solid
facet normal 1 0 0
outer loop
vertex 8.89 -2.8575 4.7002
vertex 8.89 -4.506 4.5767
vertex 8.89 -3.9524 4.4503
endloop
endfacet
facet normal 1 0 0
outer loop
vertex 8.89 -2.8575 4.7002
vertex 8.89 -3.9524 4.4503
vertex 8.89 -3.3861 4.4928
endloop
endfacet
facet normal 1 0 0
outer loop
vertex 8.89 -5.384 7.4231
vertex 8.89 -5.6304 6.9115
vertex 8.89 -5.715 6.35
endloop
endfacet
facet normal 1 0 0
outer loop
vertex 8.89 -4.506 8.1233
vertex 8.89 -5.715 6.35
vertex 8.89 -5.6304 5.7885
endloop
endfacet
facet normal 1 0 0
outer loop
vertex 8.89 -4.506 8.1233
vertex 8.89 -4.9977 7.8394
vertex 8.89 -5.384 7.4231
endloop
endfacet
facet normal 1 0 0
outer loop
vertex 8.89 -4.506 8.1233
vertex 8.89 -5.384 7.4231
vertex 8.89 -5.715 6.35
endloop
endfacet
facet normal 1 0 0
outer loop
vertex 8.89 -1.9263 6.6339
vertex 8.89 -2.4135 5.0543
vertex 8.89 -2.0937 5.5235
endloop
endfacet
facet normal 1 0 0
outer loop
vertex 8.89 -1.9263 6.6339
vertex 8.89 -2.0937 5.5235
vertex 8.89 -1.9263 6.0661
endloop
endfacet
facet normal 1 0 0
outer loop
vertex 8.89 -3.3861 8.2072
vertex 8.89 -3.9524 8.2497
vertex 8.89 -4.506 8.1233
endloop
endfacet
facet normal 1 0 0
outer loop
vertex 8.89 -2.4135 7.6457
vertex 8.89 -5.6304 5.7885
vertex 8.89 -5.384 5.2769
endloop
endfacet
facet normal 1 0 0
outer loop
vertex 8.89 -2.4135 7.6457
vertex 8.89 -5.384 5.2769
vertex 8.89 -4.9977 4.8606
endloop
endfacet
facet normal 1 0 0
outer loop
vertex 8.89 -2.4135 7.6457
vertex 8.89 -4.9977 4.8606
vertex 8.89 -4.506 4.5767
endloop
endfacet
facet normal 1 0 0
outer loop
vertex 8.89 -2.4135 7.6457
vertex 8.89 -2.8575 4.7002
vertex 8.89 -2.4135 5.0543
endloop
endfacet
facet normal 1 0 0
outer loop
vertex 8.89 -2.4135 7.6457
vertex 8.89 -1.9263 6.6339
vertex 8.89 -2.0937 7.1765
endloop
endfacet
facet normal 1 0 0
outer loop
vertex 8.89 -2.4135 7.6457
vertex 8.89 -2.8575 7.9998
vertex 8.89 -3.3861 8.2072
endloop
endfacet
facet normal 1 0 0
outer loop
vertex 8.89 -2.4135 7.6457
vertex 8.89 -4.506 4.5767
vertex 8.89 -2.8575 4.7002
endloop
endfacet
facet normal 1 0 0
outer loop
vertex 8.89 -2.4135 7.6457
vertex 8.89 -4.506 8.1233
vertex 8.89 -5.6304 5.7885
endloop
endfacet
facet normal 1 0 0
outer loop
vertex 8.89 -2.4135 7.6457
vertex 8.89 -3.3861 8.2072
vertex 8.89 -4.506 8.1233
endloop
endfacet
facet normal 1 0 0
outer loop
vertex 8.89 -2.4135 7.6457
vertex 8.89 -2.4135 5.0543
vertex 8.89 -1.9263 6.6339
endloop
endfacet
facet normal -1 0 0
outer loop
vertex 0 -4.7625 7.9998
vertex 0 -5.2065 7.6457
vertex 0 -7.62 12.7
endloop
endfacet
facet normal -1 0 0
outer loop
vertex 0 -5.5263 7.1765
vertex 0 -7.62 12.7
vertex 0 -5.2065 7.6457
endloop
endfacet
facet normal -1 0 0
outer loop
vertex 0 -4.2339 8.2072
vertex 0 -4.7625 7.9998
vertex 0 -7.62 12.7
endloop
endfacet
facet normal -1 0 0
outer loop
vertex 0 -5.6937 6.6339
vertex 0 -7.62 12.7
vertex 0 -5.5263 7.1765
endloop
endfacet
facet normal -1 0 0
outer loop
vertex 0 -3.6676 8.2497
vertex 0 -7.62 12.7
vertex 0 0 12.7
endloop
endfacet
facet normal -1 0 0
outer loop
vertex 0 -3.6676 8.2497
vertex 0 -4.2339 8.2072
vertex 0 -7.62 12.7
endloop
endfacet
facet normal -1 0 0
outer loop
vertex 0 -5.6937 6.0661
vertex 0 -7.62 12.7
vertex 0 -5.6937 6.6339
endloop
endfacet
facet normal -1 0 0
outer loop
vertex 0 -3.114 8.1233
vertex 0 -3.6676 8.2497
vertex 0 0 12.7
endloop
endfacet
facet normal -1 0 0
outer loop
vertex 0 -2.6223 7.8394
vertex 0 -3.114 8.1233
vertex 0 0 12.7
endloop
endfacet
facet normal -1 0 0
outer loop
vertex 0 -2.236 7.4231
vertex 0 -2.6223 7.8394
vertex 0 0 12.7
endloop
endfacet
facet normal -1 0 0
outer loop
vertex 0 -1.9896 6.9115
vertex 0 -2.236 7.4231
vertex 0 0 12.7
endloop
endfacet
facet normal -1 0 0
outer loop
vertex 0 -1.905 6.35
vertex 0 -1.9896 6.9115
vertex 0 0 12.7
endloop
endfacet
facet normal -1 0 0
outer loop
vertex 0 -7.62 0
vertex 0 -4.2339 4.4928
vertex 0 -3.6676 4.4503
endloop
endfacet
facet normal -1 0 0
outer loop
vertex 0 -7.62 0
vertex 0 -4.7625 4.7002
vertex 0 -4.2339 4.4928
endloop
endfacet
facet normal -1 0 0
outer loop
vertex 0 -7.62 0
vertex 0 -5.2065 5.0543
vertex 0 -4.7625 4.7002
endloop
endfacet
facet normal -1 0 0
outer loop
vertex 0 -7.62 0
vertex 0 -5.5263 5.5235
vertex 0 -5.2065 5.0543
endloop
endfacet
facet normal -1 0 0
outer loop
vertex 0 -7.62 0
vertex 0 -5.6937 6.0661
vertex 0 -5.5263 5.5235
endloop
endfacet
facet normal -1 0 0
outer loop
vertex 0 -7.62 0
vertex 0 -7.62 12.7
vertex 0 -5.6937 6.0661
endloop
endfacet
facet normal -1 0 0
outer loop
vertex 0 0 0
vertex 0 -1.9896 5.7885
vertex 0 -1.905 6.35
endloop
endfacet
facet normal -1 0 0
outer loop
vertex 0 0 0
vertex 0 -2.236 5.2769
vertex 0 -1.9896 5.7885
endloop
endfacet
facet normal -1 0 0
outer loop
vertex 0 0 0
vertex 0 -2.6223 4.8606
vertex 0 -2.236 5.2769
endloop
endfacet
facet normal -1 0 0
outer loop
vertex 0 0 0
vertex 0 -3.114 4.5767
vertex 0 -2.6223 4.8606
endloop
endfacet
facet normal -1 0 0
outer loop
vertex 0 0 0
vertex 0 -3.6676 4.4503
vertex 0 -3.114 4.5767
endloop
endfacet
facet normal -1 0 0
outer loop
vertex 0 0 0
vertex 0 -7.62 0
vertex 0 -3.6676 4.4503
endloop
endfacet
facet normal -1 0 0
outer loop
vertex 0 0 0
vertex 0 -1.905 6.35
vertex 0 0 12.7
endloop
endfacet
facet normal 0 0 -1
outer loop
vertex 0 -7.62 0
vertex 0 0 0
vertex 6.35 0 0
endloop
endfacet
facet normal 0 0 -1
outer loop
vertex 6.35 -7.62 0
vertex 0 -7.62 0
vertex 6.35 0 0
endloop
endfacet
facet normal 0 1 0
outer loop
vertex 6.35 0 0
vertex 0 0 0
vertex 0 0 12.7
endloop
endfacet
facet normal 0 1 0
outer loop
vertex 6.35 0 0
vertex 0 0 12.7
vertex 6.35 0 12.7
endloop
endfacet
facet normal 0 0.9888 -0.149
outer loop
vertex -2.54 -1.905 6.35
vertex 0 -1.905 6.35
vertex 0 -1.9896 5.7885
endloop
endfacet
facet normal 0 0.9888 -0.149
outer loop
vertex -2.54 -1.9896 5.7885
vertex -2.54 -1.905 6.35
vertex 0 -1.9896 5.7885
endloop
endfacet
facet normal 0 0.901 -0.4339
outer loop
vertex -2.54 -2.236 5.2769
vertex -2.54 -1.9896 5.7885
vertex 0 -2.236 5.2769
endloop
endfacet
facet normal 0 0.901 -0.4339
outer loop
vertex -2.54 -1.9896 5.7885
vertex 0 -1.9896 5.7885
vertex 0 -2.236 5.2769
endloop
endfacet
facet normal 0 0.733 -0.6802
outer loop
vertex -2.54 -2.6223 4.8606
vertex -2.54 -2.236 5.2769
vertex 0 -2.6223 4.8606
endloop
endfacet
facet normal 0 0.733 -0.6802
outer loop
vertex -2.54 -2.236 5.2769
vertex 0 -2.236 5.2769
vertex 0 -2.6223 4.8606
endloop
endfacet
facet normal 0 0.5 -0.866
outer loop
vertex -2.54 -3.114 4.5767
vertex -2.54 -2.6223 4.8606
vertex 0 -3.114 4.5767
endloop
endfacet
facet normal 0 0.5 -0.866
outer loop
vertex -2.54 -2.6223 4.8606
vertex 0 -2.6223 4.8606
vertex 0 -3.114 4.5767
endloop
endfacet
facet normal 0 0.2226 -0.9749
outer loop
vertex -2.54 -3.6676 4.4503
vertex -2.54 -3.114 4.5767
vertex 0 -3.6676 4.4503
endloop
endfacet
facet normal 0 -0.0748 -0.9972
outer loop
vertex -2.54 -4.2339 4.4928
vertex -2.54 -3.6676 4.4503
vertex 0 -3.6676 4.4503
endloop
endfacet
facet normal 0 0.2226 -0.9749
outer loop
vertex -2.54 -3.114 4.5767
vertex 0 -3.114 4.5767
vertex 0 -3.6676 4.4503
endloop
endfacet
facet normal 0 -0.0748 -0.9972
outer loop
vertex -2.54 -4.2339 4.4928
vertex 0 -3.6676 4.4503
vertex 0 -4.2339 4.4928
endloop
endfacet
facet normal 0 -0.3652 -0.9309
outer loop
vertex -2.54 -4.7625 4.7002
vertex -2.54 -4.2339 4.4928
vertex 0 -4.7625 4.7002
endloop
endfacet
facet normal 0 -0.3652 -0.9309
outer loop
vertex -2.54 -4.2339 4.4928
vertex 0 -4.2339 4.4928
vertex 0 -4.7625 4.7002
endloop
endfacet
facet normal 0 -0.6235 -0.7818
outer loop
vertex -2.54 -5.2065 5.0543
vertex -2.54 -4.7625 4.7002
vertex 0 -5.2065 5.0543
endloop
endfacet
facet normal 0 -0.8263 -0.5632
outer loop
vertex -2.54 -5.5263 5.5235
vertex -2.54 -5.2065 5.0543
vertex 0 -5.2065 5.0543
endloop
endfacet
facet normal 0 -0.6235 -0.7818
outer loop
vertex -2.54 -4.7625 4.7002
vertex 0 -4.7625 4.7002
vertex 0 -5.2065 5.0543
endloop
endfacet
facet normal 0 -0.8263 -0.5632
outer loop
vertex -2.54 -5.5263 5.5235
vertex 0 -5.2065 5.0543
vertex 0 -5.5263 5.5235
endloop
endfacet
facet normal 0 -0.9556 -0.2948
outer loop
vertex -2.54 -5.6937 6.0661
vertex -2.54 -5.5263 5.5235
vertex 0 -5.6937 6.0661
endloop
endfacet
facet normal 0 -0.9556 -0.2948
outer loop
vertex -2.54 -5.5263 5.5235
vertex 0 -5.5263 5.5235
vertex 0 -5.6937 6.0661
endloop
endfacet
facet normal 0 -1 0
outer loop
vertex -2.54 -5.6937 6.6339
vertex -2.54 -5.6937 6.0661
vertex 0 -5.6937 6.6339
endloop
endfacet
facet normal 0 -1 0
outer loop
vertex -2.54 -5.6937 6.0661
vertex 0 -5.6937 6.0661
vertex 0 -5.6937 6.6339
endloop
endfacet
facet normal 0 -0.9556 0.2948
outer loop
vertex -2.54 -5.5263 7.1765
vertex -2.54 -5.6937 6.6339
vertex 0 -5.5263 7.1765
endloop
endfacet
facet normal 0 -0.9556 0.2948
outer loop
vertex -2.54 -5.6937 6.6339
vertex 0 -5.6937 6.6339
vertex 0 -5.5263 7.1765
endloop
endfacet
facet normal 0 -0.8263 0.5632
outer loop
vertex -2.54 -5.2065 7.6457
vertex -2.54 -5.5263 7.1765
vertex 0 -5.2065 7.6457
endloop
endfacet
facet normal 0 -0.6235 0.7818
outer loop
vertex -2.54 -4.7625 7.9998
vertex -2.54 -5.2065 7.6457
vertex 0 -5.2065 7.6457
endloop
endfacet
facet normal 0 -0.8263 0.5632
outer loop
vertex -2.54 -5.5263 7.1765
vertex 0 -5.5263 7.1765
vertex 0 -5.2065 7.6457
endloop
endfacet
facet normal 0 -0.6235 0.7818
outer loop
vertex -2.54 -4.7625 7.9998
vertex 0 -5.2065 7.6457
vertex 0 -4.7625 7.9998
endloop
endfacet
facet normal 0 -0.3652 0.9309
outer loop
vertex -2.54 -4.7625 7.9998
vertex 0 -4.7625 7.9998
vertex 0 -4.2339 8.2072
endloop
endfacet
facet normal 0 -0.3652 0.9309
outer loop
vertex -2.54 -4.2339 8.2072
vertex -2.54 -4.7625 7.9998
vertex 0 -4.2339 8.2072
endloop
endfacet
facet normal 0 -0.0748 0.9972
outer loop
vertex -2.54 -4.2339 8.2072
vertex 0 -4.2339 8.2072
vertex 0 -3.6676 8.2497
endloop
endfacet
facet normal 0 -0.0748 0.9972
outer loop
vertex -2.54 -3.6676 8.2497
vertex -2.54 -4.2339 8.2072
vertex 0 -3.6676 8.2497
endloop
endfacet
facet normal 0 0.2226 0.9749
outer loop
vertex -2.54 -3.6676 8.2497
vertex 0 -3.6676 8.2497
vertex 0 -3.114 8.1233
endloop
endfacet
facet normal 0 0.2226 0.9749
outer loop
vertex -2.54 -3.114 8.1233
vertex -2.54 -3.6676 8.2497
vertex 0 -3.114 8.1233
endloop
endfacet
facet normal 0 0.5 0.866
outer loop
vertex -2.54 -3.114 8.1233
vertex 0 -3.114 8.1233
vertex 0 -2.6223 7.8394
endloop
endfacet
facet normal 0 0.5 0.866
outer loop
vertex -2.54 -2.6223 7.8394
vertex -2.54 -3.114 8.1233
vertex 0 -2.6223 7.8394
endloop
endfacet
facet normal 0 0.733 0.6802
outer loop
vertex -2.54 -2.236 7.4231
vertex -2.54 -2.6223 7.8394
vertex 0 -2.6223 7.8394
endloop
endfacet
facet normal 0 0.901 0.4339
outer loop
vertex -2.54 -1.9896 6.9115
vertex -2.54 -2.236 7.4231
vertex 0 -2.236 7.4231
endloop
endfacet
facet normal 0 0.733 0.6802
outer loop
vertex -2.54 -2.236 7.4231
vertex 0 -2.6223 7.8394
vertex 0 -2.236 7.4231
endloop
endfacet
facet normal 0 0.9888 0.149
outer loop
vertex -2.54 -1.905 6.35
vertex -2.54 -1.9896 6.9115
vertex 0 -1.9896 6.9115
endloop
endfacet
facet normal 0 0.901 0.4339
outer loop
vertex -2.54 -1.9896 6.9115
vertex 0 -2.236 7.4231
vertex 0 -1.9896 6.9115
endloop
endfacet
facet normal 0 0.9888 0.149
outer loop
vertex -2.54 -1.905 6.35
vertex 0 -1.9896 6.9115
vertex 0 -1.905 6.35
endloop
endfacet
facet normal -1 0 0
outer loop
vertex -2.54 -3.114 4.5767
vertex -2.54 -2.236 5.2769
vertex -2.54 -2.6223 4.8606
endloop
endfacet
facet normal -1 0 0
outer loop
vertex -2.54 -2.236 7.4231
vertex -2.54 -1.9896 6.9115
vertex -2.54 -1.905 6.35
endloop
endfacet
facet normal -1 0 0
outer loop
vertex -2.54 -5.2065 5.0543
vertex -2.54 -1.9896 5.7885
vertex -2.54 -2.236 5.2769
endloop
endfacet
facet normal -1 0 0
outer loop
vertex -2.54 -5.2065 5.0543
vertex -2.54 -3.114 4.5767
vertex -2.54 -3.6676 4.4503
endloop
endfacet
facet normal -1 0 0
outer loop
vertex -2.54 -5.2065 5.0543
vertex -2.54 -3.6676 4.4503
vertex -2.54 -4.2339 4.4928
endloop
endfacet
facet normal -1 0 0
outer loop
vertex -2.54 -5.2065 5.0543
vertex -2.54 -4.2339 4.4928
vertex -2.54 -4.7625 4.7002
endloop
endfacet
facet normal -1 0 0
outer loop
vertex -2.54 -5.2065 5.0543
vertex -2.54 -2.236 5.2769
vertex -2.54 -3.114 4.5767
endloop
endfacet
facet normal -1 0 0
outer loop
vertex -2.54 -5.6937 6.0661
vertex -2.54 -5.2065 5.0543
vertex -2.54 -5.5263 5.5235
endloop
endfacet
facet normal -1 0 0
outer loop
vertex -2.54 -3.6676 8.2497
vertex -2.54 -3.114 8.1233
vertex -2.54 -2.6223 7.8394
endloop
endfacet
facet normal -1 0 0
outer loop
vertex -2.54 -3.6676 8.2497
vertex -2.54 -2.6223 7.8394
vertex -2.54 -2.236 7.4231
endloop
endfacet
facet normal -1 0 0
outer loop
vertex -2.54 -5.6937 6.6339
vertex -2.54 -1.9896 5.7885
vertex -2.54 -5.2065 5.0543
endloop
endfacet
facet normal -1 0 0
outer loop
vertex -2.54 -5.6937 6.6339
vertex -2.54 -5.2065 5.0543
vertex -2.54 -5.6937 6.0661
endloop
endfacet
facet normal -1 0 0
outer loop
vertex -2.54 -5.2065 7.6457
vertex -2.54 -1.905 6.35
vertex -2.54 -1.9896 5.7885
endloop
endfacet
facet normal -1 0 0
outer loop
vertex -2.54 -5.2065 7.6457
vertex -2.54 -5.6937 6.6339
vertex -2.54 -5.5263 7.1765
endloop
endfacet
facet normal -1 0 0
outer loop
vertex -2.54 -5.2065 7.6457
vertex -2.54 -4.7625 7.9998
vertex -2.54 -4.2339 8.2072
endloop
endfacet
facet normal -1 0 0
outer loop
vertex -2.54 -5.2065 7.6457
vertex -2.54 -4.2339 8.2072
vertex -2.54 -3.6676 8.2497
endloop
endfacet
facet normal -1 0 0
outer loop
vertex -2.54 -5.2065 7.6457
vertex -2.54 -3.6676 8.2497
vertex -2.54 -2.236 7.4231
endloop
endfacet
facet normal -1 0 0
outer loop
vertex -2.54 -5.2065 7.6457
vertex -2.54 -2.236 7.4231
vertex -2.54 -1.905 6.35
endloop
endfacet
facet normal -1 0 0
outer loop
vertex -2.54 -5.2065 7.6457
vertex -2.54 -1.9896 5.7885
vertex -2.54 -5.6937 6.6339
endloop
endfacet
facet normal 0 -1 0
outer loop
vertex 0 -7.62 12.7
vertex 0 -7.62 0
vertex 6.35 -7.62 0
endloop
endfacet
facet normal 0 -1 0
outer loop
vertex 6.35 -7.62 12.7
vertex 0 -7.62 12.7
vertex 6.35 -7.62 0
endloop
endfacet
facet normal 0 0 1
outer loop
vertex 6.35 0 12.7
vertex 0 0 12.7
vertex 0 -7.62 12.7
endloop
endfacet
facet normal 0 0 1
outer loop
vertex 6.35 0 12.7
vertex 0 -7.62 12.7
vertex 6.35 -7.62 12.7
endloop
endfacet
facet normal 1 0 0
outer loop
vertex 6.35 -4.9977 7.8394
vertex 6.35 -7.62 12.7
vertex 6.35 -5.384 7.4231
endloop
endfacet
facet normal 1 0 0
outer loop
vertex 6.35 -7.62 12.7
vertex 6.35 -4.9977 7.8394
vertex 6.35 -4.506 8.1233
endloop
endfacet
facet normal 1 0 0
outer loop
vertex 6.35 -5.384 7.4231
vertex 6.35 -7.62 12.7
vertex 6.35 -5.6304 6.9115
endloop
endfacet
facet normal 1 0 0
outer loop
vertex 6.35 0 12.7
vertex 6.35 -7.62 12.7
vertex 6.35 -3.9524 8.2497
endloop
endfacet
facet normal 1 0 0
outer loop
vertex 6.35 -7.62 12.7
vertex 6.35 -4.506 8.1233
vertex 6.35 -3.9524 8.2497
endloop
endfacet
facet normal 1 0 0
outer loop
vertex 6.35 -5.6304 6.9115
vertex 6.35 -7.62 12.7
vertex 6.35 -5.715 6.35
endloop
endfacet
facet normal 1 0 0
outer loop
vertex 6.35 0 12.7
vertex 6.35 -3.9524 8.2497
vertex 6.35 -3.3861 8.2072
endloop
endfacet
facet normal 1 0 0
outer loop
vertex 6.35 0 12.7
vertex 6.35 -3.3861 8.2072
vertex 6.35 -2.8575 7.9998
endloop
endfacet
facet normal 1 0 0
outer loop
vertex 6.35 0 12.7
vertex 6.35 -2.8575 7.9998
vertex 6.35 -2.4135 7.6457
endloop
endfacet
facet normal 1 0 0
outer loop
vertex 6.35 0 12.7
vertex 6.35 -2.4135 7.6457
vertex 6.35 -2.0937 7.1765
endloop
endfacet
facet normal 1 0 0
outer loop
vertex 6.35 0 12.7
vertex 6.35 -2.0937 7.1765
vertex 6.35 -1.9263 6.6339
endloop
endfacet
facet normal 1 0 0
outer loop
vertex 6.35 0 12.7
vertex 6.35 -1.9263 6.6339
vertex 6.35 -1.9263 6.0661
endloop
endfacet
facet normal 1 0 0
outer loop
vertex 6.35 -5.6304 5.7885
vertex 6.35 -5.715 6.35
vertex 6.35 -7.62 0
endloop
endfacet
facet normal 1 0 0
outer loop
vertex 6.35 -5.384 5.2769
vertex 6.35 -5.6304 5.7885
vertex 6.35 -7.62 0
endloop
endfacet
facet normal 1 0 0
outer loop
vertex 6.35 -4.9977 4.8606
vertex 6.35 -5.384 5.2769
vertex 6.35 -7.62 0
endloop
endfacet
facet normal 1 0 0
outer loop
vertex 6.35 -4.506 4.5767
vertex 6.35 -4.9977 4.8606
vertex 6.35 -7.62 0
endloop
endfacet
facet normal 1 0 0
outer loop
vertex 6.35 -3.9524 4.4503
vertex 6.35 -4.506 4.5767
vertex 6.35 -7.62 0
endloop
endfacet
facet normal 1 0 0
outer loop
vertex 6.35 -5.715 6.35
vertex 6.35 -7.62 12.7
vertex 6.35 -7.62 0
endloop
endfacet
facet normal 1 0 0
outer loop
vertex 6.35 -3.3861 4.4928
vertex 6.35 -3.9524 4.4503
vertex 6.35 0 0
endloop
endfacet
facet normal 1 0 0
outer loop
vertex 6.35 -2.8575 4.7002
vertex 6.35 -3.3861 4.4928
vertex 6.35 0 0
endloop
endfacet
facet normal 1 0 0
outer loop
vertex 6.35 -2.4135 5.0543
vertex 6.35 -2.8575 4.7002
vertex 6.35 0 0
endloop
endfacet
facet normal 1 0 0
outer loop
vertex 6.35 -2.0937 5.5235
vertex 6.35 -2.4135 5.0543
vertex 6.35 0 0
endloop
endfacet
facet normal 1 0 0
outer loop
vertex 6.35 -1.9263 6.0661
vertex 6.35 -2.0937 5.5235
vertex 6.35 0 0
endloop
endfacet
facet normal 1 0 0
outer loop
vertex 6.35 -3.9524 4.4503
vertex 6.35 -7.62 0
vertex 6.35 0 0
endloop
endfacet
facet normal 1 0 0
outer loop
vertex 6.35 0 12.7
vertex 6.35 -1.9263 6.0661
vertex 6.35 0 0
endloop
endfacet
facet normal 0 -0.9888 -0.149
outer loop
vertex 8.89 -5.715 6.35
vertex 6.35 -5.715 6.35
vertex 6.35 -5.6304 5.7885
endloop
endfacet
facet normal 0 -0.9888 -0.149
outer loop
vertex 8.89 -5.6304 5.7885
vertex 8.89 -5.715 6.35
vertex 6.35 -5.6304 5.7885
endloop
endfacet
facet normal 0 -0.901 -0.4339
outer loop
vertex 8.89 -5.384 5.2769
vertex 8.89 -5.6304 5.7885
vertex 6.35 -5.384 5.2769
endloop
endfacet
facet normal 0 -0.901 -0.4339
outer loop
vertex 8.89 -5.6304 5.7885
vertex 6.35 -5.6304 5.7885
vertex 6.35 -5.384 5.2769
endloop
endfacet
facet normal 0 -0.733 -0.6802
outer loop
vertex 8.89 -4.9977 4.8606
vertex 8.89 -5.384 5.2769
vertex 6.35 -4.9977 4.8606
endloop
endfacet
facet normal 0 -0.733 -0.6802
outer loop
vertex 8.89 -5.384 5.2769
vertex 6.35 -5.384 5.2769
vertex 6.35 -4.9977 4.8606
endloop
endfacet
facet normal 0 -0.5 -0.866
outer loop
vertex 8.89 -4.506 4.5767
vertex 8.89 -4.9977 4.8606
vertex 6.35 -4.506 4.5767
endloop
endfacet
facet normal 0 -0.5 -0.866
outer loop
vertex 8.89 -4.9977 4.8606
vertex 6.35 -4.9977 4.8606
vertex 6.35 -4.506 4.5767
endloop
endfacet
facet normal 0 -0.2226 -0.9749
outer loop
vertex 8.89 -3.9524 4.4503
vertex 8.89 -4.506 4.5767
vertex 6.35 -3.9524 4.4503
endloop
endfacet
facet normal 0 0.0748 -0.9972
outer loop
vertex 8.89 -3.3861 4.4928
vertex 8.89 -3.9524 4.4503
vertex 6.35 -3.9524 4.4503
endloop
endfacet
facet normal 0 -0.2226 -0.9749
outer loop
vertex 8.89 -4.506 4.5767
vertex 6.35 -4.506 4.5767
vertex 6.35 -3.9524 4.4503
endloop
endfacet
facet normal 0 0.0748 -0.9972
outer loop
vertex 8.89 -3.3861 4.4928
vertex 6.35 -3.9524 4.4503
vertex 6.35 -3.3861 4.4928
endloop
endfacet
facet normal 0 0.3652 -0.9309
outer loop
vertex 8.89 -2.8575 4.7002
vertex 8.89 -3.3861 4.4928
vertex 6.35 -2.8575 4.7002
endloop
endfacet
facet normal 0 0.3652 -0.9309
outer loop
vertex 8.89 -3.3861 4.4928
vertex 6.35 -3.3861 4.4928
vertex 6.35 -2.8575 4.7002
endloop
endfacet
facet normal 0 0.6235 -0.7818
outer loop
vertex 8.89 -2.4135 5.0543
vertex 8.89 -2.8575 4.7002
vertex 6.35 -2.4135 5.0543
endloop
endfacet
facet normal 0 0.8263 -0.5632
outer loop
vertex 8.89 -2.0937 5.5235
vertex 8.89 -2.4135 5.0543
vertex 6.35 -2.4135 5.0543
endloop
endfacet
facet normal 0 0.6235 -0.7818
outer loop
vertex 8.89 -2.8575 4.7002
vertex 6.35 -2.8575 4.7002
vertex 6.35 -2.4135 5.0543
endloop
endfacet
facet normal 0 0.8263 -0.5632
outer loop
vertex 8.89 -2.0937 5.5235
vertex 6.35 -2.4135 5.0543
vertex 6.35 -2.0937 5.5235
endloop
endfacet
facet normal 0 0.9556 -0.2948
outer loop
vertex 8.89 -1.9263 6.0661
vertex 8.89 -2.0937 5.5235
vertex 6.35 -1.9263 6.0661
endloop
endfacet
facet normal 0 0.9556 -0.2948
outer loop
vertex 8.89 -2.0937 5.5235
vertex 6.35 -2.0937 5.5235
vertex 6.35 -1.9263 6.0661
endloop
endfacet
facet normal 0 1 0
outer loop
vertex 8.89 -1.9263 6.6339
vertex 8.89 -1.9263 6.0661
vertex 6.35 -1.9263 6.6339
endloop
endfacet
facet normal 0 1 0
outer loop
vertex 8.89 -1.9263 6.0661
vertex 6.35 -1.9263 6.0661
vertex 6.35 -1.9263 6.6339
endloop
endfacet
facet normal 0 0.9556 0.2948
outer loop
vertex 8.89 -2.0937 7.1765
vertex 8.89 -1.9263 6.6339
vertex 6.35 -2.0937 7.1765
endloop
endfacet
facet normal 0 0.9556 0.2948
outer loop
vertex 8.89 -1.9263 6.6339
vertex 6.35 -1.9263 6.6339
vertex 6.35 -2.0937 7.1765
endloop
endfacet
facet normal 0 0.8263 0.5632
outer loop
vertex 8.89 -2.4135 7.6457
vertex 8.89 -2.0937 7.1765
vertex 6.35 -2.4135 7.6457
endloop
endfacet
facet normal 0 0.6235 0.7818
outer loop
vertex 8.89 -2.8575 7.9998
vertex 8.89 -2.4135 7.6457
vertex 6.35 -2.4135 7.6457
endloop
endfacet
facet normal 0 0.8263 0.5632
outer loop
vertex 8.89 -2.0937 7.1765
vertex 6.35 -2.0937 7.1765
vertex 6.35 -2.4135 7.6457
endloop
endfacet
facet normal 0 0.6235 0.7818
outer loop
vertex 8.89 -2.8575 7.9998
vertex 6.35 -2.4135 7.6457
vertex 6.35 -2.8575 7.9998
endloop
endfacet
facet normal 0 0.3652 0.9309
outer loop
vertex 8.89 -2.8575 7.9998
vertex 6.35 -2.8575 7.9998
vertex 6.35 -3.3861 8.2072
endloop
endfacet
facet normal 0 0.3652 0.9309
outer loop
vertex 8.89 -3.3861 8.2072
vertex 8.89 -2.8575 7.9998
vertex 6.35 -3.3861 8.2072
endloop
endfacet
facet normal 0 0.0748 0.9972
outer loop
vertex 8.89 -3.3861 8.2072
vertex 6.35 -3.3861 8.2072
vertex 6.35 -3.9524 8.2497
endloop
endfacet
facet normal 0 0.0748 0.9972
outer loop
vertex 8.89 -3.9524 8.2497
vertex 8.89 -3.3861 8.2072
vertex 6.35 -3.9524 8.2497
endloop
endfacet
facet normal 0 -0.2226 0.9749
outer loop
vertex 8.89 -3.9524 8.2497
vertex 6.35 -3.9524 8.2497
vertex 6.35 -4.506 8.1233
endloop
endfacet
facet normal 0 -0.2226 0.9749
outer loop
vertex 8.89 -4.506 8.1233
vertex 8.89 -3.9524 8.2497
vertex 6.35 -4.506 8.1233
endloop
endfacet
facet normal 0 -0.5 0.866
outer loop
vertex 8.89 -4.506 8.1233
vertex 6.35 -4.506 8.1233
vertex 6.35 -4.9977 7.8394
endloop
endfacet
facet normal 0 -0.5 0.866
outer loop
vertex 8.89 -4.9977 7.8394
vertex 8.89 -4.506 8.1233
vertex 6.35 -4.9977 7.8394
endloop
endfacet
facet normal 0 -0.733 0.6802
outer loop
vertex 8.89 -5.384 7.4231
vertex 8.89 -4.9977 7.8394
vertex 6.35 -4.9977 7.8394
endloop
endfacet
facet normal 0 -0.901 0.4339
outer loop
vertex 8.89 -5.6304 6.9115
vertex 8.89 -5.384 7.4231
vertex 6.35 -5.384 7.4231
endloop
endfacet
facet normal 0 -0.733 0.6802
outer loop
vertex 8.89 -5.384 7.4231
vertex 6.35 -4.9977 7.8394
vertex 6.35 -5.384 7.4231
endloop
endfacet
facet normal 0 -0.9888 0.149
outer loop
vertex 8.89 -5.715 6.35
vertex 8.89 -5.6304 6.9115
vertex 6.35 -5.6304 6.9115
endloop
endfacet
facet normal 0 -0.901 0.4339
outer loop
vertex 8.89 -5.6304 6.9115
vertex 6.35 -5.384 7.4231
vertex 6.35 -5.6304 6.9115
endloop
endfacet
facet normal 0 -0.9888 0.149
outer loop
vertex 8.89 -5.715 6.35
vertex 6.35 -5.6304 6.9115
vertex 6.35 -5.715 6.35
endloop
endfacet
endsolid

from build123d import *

# Parameters (mm, degrees)
F0_W     = 6.35
F0_H     = 7.62
F1_DEPTH = 12.7
F3_DEPTH = 2.54
F5_DEPTH = 2.54


with BuildPart() as f1:
    # F0 (on Top) → F1 (new body)
    with BuildSketch(Plane.XY):
        with Locations((3.175, -3.81)):
            Rectangle(F0_W, F0_H)
    extrude(amount=F1_DEPTH)

    # F2 (on face) → F3 (join)
    with BuildSketch(Plane.YZ.offset(6.35)):
        with BuildLine():
            Line((-5.715, 6.35), (-3.81, 6.35))
            Line((-3.81, 6.35), (-1.905, 6.35))
            ThreePointArc((-1.905, 6.35), (-3.81, 8.255), (-5.715, 6.35))
        make_face()
        with BuildLine():
            Line((-1.905, 6.35), (-3.81, 6.35))
            Line((-3.81, 6.35), (-5.715, 6.35))
            ThreePointArc((-5.715, 6.35), (-3.81, 4.445), (-1.905, 6.35))
        make_face()
    extrude(amount=F3_DEPTH)

    # F4 (on face) → F5 (join)
    with BuildSketch(Plane(origin=(0, 0, 0), x_dir=(0, -1, 0), z_dir=(-1, 0, 0))):
        with BuildLine():
            Line((1.905, 6.35), (3.81, 6.35))
            Line((3.81, 6.35), (5.715, 6.35))
            ThreePointArc((5.715, 6.35), (3.81, 8.255), (1.905, 6.35))
        make_face()
        with BuildLine():
            Line((5.715, 6.35), (3.81, 6.35))
            Line((3.81, 6.35), (1.905, 6.35))
            ThreePointArc((1.905, 6.35), (3.81, 4.445), (5.715, 6.35))
        make_face()
    extrude(amount=F5_DEPTH)


solid = f1.part
